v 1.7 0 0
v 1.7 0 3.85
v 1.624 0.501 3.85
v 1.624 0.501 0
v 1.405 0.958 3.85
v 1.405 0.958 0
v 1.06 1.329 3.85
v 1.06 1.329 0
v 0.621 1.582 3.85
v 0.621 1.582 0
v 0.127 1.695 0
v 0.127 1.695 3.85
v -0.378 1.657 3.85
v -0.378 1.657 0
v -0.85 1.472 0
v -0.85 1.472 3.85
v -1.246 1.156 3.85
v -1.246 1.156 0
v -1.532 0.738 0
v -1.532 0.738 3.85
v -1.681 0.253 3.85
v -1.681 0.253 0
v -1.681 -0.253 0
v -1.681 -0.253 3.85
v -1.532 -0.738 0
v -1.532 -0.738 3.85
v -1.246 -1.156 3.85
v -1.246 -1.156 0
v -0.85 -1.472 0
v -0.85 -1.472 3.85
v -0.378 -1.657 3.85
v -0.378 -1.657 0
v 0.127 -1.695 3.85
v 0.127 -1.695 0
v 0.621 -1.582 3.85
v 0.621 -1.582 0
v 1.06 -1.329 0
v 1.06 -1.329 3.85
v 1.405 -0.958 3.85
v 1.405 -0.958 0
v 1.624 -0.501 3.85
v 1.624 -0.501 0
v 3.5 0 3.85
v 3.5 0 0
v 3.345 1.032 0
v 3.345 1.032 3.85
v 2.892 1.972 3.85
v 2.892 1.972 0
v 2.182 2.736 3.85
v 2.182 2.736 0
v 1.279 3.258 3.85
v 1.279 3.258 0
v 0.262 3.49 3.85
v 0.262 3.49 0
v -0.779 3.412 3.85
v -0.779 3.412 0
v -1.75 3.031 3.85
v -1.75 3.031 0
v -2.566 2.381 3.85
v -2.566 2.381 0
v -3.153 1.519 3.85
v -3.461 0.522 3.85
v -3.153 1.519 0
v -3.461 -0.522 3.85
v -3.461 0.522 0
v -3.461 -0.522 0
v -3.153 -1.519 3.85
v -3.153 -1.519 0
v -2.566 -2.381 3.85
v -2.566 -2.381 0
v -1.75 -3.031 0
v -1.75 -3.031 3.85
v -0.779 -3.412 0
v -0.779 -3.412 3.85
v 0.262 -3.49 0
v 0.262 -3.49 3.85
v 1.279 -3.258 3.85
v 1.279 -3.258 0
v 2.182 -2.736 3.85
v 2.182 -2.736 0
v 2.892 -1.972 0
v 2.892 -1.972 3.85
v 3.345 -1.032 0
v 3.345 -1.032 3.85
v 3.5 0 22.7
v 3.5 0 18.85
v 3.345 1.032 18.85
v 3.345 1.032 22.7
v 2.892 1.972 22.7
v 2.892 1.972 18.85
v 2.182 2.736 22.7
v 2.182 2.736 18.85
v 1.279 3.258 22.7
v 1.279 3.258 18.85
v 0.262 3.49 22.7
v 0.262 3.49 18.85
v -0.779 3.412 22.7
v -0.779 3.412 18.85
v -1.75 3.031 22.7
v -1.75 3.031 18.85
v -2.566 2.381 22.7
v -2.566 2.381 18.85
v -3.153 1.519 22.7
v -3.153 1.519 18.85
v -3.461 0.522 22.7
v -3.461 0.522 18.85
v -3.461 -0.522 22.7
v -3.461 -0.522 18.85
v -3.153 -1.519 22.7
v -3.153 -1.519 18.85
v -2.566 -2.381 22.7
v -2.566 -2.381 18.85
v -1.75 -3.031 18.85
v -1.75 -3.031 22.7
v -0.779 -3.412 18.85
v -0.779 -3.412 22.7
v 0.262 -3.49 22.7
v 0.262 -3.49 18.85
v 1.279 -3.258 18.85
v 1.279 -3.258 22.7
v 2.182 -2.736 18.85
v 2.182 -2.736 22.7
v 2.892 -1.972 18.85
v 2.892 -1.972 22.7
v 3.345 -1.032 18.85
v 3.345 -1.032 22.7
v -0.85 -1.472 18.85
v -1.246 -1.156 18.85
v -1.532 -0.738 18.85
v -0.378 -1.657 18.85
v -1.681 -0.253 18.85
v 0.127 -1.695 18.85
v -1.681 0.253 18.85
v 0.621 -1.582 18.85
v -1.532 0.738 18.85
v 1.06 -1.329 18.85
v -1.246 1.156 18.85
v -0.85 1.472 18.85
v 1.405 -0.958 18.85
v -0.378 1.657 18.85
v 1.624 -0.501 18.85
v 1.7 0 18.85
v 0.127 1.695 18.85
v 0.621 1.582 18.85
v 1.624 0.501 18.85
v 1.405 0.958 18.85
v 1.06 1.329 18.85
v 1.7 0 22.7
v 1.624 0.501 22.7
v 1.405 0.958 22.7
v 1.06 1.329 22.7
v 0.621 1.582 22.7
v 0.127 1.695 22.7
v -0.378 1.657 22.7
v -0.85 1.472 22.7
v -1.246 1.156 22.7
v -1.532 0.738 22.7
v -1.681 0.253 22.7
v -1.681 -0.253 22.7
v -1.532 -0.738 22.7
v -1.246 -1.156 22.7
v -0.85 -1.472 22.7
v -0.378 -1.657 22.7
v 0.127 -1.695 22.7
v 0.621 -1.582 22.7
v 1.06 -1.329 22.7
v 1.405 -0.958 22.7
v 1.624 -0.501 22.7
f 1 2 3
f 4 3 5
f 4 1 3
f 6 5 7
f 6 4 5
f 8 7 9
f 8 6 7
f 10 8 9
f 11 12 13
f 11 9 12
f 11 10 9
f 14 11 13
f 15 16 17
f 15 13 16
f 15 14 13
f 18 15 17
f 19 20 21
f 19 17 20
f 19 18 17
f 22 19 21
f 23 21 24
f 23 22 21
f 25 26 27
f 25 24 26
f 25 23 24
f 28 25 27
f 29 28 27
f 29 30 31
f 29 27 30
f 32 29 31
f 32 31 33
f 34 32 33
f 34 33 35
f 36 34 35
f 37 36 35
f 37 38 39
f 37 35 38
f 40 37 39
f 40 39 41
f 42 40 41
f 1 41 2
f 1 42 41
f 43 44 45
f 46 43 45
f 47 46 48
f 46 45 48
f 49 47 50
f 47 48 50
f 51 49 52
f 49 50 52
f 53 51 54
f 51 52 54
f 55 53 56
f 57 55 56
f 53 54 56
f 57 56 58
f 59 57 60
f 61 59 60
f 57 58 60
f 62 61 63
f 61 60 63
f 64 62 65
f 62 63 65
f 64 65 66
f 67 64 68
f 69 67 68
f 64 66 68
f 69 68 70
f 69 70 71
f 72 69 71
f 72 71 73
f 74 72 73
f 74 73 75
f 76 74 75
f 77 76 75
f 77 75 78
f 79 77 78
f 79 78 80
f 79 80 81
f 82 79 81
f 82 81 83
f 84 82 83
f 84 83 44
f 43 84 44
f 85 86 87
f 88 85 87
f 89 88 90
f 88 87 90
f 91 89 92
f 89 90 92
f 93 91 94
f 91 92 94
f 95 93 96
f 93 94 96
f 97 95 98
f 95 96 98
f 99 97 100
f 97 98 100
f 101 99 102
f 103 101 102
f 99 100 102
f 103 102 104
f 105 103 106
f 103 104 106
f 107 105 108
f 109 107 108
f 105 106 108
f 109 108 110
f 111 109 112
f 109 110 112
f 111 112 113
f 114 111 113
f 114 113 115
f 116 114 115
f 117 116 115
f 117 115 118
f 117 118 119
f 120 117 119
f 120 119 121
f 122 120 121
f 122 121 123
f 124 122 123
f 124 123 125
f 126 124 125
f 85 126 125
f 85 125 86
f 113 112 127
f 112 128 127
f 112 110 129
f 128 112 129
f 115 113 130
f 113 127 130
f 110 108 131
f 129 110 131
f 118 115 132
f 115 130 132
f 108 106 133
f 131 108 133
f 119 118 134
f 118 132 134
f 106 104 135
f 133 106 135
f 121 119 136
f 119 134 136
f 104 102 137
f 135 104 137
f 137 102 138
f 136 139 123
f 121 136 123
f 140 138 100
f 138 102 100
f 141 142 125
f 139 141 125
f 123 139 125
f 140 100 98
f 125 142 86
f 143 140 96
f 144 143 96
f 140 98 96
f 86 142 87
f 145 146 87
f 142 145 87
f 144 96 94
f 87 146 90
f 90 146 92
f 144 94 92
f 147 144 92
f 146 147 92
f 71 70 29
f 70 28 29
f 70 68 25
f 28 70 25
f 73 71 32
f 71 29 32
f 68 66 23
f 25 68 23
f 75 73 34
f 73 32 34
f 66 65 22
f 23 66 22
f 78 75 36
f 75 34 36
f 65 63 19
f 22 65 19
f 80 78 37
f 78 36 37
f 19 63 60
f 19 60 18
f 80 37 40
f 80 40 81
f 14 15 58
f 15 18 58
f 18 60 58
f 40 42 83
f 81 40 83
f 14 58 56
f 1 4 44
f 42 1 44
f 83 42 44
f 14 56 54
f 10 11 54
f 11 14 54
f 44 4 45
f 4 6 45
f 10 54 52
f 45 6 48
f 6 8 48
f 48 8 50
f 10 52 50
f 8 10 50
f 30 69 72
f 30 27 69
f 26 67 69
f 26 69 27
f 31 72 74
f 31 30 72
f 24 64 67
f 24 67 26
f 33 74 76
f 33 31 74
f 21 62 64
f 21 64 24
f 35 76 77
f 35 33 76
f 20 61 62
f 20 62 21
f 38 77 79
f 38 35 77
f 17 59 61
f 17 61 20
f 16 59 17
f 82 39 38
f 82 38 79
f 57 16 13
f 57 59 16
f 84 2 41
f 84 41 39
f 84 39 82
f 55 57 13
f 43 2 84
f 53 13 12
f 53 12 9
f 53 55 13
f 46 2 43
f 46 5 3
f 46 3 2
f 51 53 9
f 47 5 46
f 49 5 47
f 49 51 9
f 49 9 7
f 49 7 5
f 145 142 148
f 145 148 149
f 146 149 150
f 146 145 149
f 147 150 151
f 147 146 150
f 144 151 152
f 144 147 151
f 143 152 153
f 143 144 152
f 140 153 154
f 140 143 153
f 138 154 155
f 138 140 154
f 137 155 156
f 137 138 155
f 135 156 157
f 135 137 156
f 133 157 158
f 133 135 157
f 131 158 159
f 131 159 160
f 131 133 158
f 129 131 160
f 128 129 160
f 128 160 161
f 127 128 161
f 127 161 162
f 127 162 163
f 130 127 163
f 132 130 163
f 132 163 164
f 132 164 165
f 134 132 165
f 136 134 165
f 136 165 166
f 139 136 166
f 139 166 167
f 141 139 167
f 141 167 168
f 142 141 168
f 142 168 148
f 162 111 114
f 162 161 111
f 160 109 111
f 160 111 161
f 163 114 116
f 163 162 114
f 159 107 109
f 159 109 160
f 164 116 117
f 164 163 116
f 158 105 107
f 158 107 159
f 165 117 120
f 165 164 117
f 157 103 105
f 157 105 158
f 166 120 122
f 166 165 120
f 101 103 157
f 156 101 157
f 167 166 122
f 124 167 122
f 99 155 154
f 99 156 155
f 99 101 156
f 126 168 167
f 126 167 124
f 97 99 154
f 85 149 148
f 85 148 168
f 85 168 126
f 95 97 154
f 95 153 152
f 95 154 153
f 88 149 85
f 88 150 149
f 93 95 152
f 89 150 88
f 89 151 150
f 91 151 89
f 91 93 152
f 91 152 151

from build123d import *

# Parameters (mm, degrees)
SKETCH_1_R          = 3.5
SKETCH_1_R_2        = 1.7
EXTRUDE_1_DEPTH     = 22.7
SKETCH_2_R          = 3.5
CUT_EXTRUDE_1_DEPTH = 7.5


with BuildPart() as part:
    # 草图1 → 凸台-拉伸1 (new body)
    with BuildSketch(Plane.XY):
        Circle(SKETCH_1_R)
        Circle(SKETCH_1_R_2, mode=Mode.SUBTRACT)
    extrude(amount=EXTRUDE_1_DEPTH)

    # 草图2 → 切除-拉伸1 (cut, symmetric)
    with BuildSketch(Plane.XY.offset(11.35)):
        Circle(SKETCH_2_R)
    extrude(amount=CUT_EXTRUDE_1_DEPTH, both=True, mode=Mode.SUBTRACT)


with BuildPart() as cut_extrude_1_piece_1:
    # of the separate pieces the step leaves, piece 1, a body of its own (cut_extrude_1_pieces)
    add(part.part.solids().sort_by_distance((3.5, 0, 0))[0])


with BuildPart() as cut_extrude_1_piece_2:
    # of the separate pieces the step leaves, piece 2, a body of its own (cut_extrude_1_pieces)
    add(part.part.solids().sort_by_distance((3.5, 0, 18.85))[0])


solid = Compound([cut_extrude_1_piece_1.part, cut_extrude_1_piece_2.part])
